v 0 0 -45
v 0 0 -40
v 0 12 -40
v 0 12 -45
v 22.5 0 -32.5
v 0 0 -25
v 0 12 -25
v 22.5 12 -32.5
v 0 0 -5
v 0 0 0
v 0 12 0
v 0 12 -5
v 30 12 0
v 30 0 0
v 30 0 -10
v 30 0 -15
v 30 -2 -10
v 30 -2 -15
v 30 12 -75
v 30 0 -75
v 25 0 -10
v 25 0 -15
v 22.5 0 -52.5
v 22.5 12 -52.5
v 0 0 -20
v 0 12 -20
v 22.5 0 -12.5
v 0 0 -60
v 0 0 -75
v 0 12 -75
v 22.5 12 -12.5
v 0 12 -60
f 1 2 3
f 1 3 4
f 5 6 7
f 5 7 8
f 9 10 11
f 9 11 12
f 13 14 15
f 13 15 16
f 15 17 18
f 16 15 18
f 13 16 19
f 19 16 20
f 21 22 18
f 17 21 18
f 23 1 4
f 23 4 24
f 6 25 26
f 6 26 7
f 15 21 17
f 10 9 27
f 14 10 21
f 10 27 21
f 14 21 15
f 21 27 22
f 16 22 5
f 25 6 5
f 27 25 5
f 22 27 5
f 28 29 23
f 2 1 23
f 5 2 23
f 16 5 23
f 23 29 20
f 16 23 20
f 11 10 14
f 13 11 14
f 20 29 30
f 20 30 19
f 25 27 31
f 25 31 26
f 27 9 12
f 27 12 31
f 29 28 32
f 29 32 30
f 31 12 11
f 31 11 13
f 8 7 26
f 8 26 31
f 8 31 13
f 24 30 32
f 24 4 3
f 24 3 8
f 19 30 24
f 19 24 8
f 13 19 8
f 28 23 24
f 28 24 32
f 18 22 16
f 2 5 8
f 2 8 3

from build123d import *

# Parameters (mm, degrees)
SKETCH1_W           = 30
SKETCH1_H           = 75
BOSS_EXTRUDE1_DEPTH = 12
CUT_EXTRUDE1_DEPTH  = 12
LPATTERN1_COUNT     = 3
LPATTERN1_PITCH     = 20
BOUNDARY2_START     = -15
BOUNDARY2_DEPTH     = 5


# Read off the part's stored shape, not the designer's step: Boundary2
with BuildPart() as part:
    # Sketch1 → Boss-Extrude1 (new body)
    with BuildSketch(Plane(origin=(0, 0, 0), x_dir=(1, 0, 0), z_dir=(0, 1, 0))):
        with Locations((15, 37.5)):
            Rectangle(SKETCH1_W, SKETCH1_H)
    extrude(amount=BOSS_EXTRUDE1_DEPTH)

    # Sketch3 → Cut-Extrude1 (cut)
    with BuildSketch(Plane(origin=(0, 0, 0), x_dir=(1, 0, 0), z_dir=(0, 1, 0))):
        Polygon((0, 5), (22.5, 12.5), (0, 20), align=None)
    cut_extrude1 = extrude(amount=CUT_EXTRUDE1_DEPTH, mode=Mode.SUBTRACT)

    # LPattern1: Cut-Extrude1 ×3
    with Locations(*[(0, 0, -i * LPATTERN1_PITCH) for i in range(1, LPATTERN1_COUNT)]):
        add(cut_extrude1, mode=Mode.SUBTRACT)

    # Boundary2 outline → Boundary2 (add)
    with BuildSketch(Plane.XY.offset(BOUNDARY2_START)):
        Polygon((30, 0), (25, 0), (30, -2), align=None)
    extrude(amount=BOUNDARY2_DEPTH)


solid = part.part
